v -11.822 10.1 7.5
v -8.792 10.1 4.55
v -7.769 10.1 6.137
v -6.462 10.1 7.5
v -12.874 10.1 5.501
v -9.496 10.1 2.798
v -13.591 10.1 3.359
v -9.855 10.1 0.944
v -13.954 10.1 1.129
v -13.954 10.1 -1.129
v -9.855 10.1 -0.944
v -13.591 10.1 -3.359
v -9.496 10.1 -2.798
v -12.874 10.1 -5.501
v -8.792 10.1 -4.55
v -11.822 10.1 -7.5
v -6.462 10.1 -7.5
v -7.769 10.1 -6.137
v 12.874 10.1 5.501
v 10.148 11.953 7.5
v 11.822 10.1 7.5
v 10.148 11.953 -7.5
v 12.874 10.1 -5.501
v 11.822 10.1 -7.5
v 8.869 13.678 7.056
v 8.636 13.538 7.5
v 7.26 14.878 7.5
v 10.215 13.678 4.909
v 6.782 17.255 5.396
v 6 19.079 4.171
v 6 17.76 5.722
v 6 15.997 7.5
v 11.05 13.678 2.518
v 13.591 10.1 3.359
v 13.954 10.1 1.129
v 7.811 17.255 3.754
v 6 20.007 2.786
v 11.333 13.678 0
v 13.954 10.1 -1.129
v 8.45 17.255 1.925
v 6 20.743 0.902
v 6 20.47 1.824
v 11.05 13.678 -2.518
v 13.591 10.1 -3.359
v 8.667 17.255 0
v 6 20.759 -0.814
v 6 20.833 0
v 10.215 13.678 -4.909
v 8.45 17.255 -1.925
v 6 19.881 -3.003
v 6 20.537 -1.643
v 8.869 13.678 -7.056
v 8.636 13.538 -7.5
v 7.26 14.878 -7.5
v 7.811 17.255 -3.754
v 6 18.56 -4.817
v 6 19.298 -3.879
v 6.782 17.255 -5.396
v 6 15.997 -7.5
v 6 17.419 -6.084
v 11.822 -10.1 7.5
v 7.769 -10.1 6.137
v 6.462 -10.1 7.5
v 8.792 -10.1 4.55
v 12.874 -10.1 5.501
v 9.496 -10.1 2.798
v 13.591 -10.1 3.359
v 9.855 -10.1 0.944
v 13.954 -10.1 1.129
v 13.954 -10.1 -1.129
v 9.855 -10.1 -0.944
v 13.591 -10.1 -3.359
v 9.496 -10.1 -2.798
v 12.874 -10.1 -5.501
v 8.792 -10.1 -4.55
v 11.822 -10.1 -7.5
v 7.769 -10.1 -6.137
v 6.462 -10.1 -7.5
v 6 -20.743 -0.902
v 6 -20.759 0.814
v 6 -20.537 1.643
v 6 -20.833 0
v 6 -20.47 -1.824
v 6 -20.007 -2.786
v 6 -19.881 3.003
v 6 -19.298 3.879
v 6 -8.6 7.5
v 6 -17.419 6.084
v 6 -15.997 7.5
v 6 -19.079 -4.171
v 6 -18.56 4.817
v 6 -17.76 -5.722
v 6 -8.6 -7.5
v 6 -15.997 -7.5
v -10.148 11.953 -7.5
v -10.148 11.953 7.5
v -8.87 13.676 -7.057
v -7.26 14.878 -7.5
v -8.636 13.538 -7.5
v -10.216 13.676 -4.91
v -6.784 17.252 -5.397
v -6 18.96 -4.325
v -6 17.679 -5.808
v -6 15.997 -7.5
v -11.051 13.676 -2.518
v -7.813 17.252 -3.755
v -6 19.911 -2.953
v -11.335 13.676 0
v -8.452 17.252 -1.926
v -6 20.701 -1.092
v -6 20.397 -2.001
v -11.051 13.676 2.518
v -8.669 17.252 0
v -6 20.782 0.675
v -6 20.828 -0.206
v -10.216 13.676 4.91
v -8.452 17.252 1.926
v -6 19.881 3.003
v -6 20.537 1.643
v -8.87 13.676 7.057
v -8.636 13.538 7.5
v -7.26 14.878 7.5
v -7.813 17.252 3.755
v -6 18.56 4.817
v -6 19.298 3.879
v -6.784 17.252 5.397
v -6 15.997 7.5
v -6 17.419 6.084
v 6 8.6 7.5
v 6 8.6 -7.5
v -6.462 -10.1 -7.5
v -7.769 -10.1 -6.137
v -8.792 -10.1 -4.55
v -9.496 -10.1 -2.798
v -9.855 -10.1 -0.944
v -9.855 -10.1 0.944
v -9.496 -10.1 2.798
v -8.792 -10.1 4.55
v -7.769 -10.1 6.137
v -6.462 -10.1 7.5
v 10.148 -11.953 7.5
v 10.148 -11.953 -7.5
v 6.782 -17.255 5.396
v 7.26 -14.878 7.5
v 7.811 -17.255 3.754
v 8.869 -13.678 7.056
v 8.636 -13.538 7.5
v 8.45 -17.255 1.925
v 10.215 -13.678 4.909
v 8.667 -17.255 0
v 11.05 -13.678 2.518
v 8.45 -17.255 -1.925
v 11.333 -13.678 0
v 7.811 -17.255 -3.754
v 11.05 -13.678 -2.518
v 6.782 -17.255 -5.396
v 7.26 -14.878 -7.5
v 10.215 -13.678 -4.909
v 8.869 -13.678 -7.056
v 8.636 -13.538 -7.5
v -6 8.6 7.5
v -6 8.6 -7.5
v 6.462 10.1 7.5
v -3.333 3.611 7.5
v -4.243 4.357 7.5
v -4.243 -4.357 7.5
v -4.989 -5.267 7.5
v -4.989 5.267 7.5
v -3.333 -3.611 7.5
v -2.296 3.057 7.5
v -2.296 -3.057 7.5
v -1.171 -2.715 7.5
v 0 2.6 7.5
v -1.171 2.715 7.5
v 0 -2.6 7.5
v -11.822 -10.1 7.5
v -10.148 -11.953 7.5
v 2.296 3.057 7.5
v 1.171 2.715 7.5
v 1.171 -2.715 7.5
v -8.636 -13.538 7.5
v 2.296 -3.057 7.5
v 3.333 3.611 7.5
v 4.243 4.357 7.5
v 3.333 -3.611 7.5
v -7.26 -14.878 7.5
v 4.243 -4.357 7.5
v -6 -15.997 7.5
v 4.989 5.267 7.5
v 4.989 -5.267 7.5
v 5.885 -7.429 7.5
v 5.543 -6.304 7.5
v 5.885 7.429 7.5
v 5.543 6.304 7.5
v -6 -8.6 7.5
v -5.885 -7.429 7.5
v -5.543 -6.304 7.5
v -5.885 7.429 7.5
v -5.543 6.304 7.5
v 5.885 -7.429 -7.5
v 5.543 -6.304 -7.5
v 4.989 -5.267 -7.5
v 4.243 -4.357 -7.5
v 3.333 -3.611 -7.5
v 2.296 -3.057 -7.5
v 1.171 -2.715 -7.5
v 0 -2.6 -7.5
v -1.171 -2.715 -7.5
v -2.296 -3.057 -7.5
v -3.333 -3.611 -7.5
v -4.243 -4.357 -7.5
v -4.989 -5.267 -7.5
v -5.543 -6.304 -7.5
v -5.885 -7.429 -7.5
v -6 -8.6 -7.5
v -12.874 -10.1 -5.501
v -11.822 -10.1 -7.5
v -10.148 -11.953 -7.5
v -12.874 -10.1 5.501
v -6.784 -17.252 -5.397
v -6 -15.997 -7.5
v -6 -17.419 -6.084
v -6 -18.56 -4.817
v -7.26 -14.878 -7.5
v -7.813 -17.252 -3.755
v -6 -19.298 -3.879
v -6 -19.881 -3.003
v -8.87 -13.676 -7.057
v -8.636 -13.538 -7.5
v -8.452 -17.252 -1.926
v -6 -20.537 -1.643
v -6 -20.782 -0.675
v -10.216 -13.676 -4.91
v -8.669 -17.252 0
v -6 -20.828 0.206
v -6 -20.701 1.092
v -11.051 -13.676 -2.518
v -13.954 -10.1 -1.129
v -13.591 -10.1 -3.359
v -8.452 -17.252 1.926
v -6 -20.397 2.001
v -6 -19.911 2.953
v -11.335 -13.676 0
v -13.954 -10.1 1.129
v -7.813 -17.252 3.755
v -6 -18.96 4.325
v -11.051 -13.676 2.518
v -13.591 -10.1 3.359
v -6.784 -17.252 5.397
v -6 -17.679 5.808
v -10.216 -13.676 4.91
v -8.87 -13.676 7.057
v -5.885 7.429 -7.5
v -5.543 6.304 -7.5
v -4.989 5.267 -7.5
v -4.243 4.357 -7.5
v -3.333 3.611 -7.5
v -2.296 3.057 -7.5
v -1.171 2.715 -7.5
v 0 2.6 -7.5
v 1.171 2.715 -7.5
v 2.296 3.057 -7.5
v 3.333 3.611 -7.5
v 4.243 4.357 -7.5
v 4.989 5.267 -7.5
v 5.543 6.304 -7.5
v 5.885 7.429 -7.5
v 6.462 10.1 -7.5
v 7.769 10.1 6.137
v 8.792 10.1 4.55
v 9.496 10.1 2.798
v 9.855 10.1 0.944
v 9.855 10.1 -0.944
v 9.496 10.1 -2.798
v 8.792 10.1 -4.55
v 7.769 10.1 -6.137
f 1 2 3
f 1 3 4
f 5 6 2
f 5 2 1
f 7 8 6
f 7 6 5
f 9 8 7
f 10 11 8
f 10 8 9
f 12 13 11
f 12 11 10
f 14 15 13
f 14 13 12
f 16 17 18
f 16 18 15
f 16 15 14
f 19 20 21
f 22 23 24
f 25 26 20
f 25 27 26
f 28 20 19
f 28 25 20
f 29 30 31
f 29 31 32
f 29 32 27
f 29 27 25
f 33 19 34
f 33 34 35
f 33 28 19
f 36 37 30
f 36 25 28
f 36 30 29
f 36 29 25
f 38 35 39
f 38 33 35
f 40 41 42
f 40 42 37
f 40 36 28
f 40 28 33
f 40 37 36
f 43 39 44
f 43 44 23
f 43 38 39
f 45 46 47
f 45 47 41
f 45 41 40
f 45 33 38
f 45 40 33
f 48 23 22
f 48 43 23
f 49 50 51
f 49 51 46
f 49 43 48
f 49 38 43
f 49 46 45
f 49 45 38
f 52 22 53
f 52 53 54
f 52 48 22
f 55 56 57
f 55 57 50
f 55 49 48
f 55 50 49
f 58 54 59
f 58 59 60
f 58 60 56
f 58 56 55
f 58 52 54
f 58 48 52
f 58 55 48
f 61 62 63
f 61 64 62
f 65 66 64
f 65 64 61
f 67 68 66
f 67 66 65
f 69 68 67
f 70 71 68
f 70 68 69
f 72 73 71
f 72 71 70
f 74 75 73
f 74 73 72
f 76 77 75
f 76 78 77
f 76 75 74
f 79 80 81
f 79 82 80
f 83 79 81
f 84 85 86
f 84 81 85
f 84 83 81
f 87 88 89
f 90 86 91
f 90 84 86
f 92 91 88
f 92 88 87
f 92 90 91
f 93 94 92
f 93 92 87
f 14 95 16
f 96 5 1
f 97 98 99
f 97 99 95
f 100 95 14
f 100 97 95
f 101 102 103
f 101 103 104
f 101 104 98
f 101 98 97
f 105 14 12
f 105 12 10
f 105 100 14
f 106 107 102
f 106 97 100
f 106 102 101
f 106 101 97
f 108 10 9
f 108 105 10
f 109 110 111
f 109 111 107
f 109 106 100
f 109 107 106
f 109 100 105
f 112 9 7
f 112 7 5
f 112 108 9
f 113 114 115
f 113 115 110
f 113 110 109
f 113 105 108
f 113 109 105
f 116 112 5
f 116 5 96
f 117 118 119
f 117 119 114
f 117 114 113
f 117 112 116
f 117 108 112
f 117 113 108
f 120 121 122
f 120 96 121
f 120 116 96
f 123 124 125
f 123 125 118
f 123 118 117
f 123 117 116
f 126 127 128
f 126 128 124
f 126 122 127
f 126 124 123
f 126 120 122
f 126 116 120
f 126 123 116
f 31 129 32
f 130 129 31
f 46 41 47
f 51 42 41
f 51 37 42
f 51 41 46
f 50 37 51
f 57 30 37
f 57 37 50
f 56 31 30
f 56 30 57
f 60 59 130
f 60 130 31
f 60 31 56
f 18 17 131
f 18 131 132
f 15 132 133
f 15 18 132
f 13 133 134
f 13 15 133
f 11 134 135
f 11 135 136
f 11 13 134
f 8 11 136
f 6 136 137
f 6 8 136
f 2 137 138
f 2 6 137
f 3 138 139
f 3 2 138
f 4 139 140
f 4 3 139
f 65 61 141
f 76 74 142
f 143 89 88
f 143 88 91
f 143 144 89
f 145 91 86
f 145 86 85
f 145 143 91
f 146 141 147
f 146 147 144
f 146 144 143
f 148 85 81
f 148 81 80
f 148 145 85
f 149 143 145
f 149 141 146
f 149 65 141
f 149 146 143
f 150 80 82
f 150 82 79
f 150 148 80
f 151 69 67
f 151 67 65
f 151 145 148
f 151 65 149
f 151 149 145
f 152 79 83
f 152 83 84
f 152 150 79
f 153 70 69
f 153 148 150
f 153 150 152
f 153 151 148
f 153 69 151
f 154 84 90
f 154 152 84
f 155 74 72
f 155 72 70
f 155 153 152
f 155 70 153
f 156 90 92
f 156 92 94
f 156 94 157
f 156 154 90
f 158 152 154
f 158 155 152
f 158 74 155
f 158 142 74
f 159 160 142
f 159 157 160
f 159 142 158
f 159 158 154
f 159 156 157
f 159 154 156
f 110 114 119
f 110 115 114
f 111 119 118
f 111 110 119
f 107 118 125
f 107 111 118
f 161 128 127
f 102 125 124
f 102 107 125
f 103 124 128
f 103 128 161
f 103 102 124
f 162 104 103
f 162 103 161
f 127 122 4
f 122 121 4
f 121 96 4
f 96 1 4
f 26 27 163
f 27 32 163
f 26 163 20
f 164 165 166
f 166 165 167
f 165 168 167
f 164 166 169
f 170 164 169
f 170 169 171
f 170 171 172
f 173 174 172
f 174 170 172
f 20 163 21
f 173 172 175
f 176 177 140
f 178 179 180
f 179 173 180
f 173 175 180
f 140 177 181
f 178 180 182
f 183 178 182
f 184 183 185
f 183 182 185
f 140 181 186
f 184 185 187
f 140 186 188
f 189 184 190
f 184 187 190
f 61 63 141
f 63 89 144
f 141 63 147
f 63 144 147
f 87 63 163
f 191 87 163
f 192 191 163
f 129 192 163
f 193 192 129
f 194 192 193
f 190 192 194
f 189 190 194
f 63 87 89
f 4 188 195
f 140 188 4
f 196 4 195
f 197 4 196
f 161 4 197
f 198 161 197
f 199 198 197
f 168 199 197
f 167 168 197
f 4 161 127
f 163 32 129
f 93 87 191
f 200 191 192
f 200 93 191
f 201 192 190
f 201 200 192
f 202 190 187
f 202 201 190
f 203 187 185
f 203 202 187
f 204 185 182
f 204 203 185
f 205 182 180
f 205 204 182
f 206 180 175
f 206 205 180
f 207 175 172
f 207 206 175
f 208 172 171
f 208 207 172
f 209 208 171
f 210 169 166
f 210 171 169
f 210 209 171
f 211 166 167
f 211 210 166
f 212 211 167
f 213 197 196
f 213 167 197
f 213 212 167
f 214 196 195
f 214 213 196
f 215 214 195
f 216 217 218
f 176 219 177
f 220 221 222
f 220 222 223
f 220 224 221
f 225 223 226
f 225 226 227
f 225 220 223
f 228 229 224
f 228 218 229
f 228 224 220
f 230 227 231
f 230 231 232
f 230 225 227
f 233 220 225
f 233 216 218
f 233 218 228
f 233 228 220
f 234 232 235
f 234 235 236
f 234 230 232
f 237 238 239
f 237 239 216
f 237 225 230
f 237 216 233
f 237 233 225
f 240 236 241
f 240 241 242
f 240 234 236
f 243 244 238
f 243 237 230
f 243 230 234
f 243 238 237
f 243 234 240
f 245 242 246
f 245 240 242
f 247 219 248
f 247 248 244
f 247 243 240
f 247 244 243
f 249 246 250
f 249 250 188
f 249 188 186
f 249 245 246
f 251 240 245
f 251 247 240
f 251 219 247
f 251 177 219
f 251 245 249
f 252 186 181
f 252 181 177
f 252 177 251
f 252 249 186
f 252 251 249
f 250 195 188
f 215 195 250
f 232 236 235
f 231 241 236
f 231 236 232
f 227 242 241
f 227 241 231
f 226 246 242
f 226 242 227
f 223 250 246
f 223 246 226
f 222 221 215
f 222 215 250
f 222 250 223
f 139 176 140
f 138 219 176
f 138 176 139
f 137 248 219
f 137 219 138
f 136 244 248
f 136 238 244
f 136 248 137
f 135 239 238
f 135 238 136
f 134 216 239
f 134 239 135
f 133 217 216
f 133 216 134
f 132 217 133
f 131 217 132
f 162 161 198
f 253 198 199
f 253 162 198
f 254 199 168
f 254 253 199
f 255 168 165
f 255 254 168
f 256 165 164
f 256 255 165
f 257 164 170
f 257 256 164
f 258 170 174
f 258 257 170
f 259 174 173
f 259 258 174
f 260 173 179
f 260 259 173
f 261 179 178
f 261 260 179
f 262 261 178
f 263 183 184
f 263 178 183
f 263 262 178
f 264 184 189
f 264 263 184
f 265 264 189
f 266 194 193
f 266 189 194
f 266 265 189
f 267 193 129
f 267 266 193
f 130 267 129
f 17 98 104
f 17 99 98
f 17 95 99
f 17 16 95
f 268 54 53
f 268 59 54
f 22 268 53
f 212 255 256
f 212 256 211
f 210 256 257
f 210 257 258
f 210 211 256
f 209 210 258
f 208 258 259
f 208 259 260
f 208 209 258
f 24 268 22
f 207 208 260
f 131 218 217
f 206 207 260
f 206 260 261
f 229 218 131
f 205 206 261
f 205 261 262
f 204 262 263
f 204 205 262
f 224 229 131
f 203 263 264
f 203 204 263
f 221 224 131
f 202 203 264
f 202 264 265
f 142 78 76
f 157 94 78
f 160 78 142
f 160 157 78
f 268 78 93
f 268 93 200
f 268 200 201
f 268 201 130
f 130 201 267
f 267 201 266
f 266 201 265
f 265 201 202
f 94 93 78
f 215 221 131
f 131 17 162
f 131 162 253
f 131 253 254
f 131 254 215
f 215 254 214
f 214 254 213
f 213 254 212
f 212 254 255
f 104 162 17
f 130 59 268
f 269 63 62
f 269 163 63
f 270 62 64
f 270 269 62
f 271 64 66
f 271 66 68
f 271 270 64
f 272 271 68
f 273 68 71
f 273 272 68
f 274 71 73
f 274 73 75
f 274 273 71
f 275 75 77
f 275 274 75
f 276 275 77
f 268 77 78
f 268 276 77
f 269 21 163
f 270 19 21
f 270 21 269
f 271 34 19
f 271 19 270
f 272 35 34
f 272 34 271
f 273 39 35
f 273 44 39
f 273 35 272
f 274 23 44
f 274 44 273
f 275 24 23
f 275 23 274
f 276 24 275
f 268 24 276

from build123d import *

# Parameters (mm, degrees)
ESBO_O2_OUTSIDE_W          = 42.476
ESBO_O2_OUTSIDE_H          = 42.476
ESBO_O2_OUTSIDE_W_2        = 28
ESBO_O2_OUTSIDE_H_2        = 15
CORTE_EXTRUS_O1_DEPTH      = 25.1
CORTE_EXTRUS_O1_DEPTH_BACK = 25.1
CORTE_EXTRUS_O2_DEPTH      = 16


with BuildPart() as part:
    # Esboço1 one side → Revolução1 (revolve)
    with BuildSketch(Plane.XY):
        with BuildLine():
            ThreePointArc((4, 23.516407865), (2.02117415, 23.953333716), (0, 24.1))
            Line((0, 24.1), (0, -24.1))
            ThreePointArc((0, -24.1), (2.02117415, -23.953333716), (4, -23.516407865))
            Line((4, -23.516407865), (14, -10.1))
            Line((14, -10.1), (9.9, -10.1))
            Line((9.9, -10.1), (9.9, 10.1))
            Line((9.9, 10.1), (14, 10.1))
            Line((14, 10.1), (4, 23.516407865))
        make_face()
    revolve(axis=Axis((0, -24.1, 0), (0, 1, 0)))

    # Esboço2 outside → Corte-extrusão1 (cut, two sides)
    with BuildSketch(Plane(origin=(0, 0, 0), x_dir=(1, 0, 0), z_dir=(0, 1, 0))) as corte_extrus_o1_sk:
        Rectangle(ESBO_O2_OUTSIDE_W, ESBO_O2_OUTSIDE_H)
        Rectangle(ESBO_O2_OUTSIDE_W_2, ESBO_O2_OUTSIDE_H_2, mode=Mode.SUBTRACT)
    extrude(amount=CORTE_EXTRUS_O1_DEPTH, mode=Mode.SUBTRACT)
    extrude(corte_extrus_o1_sk.sketch, amount=-CORTE_EXTRUS_O1_DEPTH_BACK, mode=Mode.SUBTRACT)

    # Esboço3 → Corte-extrusão2 (cut, through all)
    with BuildSketch(Plane(origin=(0, 0, -7.5), x_dir=(-1, 0, 0), z_dir=(0, 0, -1))):
        with BuildLine():
            Line((6, 24.1), (6, 8.6))
            ThreePointArc((6, 8.6), (0, 2.6), (-6, 8.6))
            Line((-6, 8.6), (-6, 24.1))
            ThreePointArc((-6, 24.1), (0, 30.1), (6, 24.1))
        make_face()
        with BuildLine():
            Line((-6, -24.1), (-6, -8.6))
            ThreePointArc((-6, -8.6), (0, -2.6), (6, -8.6))
            Line((6, -8.6), (6, -24.1))
            ThreePointArc((6, -24.1), (0, -30.1), (-6, -24.1))
        make_face()
    extrude(amount=-CORTE_EXTRUS_O2_DEPTH, mode=Mode.SUBTRACT)


solid = part.part
